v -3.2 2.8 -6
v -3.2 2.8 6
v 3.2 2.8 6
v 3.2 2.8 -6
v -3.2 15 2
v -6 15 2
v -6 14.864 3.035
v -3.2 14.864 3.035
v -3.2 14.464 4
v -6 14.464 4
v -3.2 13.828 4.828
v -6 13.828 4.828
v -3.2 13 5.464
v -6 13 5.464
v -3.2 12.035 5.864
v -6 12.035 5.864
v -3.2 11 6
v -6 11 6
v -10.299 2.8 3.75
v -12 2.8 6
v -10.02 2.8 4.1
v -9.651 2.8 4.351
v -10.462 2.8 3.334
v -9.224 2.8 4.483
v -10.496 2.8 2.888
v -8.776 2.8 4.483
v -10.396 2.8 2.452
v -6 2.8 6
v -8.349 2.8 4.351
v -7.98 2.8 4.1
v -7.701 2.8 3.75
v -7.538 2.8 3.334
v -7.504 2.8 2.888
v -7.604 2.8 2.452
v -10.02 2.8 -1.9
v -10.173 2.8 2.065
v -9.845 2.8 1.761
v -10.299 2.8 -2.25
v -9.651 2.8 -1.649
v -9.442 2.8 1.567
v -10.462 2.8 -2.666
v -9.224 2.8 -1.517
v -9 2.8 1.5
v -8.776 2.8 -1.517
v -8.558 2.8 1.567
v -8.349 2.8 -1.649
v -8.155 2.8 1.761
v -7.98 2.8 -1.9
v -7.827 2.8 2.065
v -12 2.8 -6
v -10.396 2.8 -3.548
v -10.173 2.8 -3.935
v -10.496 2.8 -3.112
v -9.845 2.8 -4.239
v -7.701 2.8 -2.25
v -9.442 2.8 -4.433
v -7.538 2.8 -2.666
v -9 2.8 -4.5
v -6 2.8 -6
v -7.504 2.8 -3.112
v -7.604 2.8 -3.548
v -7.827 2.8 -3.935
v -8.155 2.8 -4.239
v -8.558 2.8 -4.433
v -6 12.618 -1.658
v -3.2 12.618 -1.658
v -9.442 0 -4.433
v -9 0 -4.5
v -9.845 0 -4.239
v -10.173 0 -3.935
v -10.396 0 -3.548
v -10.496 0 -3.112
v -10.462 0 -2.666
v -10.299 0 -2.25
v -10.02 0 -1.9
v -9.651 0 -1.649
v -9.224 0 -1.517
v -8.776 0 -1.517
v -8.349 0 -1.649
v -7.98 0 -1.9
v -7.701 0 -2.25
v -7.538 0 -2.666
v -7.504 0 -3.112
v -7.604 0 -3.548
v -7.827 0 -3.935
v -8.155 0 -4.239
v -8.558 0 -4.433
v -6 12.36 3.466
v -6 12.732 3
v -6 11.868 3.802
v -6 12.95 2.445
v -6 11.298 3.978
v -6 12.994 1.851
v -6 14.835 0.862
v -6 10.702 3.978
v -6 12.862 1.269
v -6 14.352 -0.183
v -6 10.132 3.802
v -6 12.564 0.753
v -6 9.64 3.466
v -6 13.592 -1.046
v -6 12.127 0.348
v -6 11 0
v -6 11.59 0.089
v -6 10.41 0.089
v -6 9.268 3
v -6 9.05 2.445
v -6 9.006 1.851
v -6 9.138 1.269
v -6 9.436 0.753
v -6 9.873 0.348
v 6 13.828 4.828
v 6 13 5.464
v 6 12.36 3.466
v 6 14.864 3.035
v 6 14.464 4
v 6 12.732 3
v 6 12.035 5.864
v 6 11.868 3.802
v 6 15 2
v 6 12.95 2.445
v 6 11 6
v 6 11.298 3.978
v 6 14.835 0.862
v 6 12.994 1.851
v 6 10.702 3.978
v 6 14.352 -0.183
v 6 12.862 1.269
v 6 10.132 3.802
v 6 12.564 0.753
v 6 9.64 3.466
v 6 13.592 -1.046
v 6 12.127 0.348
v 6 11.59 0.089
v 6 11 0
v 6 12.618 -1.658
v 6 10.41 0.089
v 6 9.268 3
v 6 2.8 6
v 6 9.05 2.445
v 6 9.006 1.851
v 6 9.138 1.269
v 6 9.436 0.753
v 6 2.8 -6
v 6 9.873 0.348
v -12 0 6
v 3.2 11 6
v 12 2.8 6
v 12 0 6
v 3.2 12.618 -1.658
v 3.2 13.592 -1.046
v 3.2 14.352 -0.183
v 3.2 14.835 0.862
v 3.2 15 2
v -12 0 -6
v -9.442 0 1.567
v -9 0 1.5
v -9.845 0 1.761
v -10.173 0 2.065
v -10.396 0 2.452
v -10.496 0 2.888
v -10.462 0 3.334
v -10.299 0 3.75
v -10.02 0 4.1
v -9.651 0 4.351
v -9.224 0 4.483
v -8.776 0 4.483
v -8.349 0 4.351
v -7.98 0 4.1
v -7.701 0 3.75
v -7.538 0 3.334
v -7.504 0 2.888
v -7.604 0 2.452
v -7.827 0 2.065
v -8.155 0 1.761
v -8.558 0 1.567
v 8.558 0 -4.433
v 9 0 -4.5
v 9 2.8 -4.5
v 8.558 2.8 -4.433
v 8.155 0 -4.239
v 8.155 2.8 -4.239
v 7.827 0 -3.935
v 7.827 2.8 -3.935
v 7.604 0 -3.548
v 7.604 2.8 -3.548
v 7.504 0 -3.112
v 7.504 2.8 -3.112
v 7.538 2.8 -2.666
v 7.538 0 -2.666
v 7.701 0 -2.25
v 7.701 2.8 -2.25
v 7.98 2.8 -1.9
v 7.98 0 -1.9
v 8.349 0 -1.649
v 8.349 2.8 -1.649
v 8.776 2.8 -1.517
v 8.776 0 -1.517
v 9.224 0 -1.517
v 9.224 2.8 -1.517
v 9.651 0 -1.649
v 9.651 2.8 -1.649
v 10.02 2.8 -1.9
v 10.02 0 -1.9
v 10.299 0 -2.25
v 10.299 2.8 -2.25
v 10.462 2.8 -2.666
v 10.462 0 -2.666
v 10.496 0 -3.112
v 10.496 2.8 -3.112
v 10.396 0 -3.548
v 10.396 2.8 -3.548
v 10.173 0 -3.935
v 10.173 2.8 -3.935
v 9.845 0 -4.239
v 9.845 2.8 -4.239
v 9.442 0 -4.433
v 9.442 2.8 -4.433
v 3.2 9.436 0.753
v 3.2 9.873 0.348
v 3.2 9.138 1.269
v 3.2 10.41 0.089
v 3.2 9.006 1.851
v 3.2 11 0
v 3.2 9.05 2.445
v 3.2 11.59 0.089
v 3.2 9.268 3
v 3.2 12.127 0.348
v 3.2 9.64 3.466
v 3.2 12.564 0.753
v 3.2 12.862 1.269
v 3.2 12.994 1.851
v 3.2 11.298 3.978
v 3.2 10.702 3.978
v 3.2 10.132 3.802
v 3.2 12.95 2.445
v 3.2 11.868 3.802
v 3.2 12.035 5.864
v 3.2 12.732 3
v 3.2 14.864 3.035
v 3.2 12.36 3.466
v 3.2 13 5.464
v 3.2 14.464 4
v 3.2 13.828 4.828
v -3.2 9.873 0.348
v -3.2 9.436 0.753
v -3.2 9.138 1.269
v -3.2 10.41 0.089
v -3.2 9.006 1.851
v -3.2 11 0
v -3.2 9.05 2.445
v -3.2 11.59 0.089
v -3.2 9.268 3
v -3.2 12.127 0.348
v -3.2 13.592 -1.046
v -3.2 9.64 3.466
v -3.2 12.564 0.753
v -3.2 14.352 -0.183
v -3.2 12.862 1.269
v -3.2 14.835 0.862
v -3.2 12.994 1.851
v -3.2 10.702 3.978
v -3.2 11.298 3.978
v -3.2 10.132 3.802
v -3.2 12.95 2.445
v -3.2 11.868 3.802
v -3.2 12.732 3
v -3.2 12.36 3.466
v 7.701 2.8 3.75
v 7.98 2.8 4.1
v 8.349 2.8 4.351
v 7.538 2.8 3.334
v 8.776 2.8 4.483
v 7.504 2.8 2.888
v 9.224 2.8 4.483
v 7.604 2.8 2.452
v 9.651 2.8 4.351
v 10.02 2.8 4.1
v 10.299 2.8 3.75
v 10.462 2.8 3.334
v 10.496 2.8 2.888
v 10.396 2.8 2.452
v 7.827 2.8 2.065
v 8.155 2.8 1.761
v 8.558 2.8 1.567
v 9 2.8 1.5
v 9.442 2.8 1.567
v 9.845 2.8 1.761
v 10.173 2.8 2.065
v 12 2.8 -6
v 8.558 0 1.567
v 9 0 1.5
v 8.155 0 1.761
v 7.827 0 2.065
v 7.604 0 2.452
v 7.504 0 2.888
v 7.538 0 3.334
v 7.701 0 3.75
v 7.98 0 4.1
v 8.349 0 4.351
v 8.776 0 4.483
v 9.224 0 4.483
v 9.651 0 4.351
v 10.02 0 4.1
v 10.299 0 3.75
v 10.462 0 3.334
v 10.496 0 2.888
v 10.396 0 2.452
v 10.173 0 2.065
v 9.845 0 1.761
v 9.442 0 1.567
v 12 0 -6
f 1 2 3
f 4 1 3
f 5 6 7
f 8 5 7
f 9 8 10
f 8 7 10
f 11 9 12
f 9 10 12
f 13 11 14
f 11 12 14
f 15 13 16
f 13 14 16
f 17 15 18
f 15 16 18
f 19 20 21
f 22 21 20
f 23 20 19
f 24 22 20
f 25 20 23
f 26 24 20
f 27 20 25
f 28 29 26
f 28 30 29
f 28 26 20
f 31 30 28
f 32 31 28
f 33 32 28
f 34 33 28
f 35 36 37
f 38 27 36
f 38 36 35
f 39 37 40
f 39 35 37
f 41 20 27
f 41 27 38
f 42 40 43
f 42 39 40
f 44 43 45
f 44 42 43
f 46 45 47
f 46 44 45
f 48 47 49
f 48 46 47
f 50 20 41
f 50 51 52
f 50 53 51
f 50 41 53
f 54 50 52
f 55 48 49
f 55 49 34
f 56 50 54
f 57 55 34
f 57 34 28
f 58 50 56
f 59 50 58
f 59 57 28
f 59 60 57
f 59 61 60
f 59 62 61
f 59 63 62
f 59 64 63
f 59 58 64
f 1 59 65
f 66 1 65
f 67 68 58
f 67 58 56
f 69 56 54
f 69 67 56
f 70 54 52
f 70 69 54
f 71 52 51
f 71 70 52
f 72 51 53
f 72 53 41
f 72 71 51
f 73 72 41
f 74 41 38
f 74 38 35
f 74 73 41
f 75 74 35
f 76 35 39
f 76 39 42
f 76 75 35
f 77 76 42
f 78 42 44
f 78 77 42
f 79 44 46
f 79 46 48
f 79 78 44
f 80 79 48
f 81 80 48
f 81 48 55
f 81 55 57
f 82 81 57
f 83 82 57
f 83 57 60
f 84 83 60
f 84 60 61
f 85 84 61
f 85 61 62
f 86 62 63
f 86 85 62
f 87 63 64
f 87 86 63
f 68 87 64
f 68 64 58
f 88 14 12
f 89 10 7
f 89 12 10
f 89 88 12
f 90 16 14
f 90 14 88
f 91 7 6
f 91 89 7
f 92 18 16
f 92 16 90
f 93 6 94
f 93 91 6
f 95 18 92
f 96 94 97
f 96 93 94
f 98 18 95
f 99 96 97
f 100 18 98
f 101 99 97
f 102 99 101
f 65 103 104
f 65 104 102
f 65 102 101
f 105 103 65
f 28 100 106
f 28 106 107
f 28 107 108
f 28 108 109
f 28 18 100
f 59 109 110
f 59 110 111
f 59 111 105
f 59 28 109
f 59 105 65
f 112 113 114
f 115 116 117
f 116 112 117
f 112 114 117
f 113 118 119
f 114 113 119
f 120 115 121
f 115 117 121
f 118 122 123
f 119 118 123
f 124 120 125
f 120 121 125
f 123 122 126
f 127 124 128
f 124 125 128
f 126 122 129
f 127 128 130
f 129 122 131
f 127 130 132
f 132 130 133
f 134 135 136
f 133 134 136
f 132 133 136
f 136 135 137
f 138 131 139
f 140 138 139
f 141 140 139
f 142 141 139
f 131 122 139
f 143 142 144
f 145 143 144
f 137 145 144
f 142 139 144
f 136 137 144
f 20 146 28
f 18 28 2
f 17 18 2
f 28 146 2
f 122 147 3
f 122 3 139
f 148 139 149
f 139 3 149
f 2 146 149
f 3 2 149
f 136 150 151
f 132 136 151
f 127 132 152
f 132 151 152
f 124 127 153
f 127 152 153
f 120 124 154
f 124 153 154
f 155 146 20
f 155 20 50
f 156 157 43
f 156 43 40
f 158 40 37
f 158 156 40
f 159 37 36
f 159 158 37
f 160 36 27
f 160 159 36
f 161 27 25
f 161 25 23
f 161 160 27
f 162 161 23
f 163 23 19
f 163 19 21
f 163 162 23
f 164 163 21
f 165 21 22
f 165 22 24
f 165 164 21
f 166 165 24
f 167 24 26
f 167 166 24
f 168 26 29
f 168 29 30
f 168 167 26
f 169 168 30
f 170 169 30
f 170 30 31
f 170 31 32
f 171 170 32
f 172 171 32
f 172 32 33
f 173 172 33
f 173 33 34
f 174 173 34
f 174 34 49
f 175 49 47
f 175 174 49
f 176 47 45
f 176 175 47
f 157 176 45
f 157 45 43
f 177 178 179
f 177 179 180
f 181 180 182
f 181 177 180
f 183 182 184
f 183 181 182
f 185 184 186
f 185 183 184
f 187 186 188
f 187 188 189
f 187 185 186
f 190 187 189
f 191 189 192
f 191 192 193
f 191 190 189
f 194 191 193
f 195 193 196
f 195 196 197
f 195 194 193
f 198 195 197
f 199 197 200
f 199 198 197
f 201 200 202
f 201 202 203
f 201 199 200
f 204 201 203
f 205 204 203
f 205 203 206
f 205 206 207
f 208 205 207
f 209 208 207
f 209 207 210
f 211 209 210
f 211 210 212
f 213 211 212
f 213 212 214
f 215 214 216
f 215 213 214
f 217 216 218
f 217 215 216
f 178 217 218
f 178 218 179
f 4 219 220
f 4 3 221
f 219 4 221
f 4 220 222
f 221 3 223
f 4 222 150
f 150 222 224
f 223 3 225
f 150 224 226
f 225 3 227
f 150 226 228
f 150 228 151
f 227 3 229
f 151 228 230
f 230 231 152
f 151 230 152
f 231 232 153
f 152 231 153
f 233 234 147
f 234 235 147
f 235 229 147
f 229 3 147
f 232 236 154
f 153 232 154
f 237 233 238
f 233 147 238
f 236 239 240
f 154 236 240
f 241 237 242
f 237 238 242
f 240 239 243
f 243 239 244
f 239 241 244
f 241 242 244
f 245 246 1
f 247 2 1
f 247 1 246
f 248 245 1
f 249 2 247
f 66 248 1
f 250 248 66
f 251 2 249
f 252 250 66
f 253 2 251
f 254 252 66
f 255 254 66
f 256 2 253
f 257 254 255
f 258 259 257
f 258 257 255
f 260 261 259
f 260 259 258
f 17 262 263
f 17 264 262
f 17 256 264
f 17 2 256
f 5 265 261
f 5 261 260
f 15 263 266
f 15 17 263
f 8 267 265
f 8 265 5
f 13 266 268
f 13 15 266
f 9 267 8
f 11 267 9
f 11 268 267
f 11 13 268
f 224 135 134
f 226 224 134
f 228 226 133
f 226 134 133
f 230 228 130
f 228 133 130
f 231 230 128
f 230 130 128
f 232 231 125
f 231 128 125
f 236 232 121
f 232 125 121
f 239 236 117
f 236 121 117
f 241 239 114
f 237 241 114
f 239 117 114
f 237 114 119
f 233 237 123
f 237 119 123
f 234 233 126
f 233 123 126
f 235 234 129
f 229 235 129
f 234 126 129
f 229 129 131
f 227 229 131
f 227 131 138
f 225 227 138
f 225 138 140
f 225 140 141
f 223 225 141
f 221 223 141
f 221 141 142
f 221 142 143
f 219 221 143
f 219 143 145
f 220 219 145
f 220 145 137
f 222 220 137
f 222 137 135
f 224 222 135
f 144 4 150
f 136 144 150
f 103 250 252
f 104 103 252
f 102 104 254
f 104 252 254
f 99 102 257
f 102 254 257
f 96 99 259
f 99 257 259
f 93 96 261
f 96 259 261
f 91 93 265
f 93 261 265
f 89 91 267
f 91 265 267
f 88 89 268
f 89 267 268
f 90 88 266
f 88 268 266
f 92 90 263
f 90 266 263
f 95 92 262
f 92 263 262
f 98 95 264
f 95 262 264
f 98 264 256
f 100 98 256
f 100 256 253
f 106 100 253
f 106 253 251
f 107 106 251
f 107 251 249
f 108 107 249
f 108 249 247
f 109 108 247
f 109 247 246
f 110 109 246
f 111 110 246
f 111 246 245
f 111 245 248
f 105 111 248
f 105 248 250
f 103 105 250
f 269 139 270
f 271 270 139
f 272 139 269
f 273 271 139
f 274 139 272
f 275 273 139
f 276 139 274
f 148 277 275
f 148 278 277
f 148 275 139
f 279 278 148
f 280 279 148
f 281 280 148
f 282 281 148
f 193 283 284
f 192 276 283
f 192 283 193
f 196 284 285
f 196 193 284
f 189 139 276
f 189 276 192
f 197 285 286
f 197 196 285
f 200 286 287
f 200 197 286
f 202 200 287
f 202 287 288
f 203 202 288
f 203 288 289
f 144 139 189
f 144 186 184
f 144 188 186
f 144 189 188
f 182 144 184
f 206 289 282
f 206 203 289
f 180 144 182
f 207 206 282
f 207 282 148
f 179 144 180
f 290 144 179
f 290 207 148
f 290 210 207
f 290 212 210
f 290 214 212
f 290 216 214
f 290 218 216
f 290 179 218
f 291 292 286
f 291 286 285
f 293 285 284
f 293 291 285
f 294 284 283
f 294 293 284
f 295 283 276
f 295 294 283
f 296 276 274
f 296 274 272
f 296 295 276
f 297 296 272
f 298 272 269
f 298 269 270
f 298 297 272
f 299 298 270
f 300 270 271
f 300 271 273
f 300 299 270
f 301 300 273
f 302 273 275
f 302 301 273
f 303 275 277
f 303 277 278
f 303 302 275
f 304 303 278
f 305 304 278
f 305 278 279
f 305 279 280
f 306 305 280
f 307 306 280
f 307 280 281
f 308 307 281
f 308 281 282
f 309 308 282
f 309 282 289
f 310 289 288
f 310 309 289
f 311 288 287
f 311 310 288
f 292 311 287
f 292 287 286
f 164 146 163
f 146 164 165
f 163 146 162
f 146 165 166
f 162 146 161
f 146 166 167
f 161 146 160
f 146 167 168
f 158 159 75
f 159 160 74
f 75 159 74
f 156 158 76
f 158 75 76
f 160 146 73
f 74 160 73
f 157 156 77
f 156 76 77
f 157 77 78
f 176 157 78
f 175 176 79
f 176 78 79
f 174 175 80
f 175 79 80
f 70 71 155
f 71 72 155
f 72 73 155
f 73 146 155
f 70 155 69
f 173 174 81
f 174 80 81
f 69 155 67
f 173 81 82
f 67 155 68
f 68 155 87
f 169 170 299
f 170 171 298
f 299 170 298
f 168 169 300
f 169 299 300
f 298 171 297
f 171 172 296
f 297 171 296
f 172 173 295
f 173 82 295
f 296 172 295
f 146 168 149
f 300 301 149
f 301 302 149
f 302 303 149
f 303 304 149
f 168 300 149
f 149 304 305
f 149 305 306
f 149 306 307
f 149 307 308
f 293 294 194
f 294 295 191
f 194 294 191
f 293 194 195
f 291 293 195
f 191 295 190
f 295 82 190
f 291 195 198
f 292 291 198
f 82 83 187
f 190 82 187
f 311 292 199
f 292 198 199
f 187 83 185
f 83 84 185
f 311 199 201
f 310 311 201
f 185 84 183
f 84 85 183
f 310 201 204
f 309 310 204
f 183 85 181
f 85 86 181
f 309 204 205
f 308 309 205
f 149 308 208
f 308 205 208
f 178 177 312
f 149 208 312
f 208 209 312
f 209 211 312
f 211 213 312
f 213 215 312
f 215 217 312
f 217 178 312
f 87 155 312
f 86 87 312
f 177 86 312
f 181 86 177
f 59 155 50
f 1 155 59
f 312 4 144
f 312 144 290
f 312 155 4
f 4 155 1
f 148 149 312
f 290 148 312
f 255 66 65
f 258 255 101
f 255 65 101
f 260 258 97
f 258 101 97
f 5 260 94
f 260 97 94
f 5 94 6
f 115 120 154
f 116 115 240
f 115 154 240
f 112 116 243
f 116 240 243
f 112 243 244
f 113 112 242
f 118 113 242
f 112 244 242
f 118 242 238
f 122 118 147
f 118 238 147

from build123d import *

# Parameters (mm, degrees)
SKETCH_1_W          = 12
SKETCH_1_H          = 12
EXTRUDE_1_DEPTH     = 15
SKETCH_2_W          = 6.4
SKETCH_2_H          = 12.2
CUT_EXTRUDE_1_DEPTH = 12
CUT_EXTRUDE_2_DEPTH = 12
SKETCH_8_R          = 2
CUT_EXTRUDE_3_DEPTH = 21.124611797
SKETCH_10_W         = 6
SKETCH_10_H         = 12
SKETCH_10_R         = 1.5
EXTRUDE_2_DEPTH     = 2.8


with BuildPart() as part:
    # 草图1 → 凸台-拉伸1 (new body)
    with BuildSketch(Plane(origin=(0, 0, 0), x_dir=(1, 0, 0), z_dir=(0, 1, 0))):
        Rectangle(SKETCH_1_W, SKETCH_1_H)
    extrude(amount=EXTRUDE_1_DEPTH)

    # 草图2 → 切除-拉伸1 (cut)
    with BuildSketch(Plane.XY.offset(6)):
        with Locations((0, 8.9)):
            Rectangle(SKETCH_2_W, SKETCH_2_H)
    extrude(amount=-CUT_EXTRUDE_1_DEPTH, mode=Mode.SUBTRACT)

    # 草图3 → 切除-拉伸2 (cut)
    with BuildSketch(Plane.ZY.offset(6)):
        with BuildLine():
            Line((-6, 15), (-6, 2.8))
            Line((-6, 2.8), (-1.658241819, 12.617796896))
            ThreePointArc((-1.658241819, 12.617796896), (-0.18275198, 14.351953728), (2, 15))
            Line((2, 15), (-6, 15))
        make_face()
        with BuildLine():
            ThreePointArc((2, 15), (4.828427125, 13.828427125), (6, 11))
            Line((6, 11), (6, 15))
            Line((6, 15), (2, 15))
        make_face()
    extrude(amount=-CUT_EXTRUDE_2_DEPTH, mode=Mode.SUBTRACT)

    # 草图8 → 切除-拉伸3 (cut, through all)
    with BuildSketch(Plane(origin=(6, 0, 0), x_dir=(0, 0, -1), z_dir=(1, 0, 0))):
        with Locations((-2, 11)):
            Circle(SKETCH_8_R)
    extrude(amount=-CUT_EXTRUDE_3_DEPTH, mode=Mode.SUBTRACT)

    # 草图10 → 凸台-拉伸2 (add)
    # profile 1 of 2: a face of its own
    with BuildSketch(Plane(origin=(0, 0, 0), x_dir=(1, 0, 0), z_dir=(0, 1, 0))):
        with Locations((-9, 0)):
            Rectangle(SKETCH_10_W, SKETCH_10_H)
        with Locations(Location((-9, 3, 0), (0, 0, 90))):
            Circle(SKETCH_10_R, mode=Mode.SUBTRACT)
        with Locations(Location((-9, -3, 0), (0, 0, 90))):
            Circle(SKETCH_10_R, mode=Mode.SUBTRACT)
    # profile 2 of 2: a face of its own
    with BuildSketch(Plane(origin=(0, 0, 0), x_dir=(1, 0, 0), z_dir=(0, 1, 0))):
        with Locations((9, 0)):
            Rectangle(SKETCH_10_W, SKETCH_10_H)
        with Locations(Location((9, 3, 0), (0, 0, 90))):
            Circle(SKETCH_10_R, mode=Mode.SUBTRACT)
        with Locations(Location((9, -3, 0), (0, 0, 90))):
            Circle(SKETCH_10_R, mode=Mode.SUBTRACT)
    extrude(amount=EXTRUDE_2_DEPTH)


solid = part.part
